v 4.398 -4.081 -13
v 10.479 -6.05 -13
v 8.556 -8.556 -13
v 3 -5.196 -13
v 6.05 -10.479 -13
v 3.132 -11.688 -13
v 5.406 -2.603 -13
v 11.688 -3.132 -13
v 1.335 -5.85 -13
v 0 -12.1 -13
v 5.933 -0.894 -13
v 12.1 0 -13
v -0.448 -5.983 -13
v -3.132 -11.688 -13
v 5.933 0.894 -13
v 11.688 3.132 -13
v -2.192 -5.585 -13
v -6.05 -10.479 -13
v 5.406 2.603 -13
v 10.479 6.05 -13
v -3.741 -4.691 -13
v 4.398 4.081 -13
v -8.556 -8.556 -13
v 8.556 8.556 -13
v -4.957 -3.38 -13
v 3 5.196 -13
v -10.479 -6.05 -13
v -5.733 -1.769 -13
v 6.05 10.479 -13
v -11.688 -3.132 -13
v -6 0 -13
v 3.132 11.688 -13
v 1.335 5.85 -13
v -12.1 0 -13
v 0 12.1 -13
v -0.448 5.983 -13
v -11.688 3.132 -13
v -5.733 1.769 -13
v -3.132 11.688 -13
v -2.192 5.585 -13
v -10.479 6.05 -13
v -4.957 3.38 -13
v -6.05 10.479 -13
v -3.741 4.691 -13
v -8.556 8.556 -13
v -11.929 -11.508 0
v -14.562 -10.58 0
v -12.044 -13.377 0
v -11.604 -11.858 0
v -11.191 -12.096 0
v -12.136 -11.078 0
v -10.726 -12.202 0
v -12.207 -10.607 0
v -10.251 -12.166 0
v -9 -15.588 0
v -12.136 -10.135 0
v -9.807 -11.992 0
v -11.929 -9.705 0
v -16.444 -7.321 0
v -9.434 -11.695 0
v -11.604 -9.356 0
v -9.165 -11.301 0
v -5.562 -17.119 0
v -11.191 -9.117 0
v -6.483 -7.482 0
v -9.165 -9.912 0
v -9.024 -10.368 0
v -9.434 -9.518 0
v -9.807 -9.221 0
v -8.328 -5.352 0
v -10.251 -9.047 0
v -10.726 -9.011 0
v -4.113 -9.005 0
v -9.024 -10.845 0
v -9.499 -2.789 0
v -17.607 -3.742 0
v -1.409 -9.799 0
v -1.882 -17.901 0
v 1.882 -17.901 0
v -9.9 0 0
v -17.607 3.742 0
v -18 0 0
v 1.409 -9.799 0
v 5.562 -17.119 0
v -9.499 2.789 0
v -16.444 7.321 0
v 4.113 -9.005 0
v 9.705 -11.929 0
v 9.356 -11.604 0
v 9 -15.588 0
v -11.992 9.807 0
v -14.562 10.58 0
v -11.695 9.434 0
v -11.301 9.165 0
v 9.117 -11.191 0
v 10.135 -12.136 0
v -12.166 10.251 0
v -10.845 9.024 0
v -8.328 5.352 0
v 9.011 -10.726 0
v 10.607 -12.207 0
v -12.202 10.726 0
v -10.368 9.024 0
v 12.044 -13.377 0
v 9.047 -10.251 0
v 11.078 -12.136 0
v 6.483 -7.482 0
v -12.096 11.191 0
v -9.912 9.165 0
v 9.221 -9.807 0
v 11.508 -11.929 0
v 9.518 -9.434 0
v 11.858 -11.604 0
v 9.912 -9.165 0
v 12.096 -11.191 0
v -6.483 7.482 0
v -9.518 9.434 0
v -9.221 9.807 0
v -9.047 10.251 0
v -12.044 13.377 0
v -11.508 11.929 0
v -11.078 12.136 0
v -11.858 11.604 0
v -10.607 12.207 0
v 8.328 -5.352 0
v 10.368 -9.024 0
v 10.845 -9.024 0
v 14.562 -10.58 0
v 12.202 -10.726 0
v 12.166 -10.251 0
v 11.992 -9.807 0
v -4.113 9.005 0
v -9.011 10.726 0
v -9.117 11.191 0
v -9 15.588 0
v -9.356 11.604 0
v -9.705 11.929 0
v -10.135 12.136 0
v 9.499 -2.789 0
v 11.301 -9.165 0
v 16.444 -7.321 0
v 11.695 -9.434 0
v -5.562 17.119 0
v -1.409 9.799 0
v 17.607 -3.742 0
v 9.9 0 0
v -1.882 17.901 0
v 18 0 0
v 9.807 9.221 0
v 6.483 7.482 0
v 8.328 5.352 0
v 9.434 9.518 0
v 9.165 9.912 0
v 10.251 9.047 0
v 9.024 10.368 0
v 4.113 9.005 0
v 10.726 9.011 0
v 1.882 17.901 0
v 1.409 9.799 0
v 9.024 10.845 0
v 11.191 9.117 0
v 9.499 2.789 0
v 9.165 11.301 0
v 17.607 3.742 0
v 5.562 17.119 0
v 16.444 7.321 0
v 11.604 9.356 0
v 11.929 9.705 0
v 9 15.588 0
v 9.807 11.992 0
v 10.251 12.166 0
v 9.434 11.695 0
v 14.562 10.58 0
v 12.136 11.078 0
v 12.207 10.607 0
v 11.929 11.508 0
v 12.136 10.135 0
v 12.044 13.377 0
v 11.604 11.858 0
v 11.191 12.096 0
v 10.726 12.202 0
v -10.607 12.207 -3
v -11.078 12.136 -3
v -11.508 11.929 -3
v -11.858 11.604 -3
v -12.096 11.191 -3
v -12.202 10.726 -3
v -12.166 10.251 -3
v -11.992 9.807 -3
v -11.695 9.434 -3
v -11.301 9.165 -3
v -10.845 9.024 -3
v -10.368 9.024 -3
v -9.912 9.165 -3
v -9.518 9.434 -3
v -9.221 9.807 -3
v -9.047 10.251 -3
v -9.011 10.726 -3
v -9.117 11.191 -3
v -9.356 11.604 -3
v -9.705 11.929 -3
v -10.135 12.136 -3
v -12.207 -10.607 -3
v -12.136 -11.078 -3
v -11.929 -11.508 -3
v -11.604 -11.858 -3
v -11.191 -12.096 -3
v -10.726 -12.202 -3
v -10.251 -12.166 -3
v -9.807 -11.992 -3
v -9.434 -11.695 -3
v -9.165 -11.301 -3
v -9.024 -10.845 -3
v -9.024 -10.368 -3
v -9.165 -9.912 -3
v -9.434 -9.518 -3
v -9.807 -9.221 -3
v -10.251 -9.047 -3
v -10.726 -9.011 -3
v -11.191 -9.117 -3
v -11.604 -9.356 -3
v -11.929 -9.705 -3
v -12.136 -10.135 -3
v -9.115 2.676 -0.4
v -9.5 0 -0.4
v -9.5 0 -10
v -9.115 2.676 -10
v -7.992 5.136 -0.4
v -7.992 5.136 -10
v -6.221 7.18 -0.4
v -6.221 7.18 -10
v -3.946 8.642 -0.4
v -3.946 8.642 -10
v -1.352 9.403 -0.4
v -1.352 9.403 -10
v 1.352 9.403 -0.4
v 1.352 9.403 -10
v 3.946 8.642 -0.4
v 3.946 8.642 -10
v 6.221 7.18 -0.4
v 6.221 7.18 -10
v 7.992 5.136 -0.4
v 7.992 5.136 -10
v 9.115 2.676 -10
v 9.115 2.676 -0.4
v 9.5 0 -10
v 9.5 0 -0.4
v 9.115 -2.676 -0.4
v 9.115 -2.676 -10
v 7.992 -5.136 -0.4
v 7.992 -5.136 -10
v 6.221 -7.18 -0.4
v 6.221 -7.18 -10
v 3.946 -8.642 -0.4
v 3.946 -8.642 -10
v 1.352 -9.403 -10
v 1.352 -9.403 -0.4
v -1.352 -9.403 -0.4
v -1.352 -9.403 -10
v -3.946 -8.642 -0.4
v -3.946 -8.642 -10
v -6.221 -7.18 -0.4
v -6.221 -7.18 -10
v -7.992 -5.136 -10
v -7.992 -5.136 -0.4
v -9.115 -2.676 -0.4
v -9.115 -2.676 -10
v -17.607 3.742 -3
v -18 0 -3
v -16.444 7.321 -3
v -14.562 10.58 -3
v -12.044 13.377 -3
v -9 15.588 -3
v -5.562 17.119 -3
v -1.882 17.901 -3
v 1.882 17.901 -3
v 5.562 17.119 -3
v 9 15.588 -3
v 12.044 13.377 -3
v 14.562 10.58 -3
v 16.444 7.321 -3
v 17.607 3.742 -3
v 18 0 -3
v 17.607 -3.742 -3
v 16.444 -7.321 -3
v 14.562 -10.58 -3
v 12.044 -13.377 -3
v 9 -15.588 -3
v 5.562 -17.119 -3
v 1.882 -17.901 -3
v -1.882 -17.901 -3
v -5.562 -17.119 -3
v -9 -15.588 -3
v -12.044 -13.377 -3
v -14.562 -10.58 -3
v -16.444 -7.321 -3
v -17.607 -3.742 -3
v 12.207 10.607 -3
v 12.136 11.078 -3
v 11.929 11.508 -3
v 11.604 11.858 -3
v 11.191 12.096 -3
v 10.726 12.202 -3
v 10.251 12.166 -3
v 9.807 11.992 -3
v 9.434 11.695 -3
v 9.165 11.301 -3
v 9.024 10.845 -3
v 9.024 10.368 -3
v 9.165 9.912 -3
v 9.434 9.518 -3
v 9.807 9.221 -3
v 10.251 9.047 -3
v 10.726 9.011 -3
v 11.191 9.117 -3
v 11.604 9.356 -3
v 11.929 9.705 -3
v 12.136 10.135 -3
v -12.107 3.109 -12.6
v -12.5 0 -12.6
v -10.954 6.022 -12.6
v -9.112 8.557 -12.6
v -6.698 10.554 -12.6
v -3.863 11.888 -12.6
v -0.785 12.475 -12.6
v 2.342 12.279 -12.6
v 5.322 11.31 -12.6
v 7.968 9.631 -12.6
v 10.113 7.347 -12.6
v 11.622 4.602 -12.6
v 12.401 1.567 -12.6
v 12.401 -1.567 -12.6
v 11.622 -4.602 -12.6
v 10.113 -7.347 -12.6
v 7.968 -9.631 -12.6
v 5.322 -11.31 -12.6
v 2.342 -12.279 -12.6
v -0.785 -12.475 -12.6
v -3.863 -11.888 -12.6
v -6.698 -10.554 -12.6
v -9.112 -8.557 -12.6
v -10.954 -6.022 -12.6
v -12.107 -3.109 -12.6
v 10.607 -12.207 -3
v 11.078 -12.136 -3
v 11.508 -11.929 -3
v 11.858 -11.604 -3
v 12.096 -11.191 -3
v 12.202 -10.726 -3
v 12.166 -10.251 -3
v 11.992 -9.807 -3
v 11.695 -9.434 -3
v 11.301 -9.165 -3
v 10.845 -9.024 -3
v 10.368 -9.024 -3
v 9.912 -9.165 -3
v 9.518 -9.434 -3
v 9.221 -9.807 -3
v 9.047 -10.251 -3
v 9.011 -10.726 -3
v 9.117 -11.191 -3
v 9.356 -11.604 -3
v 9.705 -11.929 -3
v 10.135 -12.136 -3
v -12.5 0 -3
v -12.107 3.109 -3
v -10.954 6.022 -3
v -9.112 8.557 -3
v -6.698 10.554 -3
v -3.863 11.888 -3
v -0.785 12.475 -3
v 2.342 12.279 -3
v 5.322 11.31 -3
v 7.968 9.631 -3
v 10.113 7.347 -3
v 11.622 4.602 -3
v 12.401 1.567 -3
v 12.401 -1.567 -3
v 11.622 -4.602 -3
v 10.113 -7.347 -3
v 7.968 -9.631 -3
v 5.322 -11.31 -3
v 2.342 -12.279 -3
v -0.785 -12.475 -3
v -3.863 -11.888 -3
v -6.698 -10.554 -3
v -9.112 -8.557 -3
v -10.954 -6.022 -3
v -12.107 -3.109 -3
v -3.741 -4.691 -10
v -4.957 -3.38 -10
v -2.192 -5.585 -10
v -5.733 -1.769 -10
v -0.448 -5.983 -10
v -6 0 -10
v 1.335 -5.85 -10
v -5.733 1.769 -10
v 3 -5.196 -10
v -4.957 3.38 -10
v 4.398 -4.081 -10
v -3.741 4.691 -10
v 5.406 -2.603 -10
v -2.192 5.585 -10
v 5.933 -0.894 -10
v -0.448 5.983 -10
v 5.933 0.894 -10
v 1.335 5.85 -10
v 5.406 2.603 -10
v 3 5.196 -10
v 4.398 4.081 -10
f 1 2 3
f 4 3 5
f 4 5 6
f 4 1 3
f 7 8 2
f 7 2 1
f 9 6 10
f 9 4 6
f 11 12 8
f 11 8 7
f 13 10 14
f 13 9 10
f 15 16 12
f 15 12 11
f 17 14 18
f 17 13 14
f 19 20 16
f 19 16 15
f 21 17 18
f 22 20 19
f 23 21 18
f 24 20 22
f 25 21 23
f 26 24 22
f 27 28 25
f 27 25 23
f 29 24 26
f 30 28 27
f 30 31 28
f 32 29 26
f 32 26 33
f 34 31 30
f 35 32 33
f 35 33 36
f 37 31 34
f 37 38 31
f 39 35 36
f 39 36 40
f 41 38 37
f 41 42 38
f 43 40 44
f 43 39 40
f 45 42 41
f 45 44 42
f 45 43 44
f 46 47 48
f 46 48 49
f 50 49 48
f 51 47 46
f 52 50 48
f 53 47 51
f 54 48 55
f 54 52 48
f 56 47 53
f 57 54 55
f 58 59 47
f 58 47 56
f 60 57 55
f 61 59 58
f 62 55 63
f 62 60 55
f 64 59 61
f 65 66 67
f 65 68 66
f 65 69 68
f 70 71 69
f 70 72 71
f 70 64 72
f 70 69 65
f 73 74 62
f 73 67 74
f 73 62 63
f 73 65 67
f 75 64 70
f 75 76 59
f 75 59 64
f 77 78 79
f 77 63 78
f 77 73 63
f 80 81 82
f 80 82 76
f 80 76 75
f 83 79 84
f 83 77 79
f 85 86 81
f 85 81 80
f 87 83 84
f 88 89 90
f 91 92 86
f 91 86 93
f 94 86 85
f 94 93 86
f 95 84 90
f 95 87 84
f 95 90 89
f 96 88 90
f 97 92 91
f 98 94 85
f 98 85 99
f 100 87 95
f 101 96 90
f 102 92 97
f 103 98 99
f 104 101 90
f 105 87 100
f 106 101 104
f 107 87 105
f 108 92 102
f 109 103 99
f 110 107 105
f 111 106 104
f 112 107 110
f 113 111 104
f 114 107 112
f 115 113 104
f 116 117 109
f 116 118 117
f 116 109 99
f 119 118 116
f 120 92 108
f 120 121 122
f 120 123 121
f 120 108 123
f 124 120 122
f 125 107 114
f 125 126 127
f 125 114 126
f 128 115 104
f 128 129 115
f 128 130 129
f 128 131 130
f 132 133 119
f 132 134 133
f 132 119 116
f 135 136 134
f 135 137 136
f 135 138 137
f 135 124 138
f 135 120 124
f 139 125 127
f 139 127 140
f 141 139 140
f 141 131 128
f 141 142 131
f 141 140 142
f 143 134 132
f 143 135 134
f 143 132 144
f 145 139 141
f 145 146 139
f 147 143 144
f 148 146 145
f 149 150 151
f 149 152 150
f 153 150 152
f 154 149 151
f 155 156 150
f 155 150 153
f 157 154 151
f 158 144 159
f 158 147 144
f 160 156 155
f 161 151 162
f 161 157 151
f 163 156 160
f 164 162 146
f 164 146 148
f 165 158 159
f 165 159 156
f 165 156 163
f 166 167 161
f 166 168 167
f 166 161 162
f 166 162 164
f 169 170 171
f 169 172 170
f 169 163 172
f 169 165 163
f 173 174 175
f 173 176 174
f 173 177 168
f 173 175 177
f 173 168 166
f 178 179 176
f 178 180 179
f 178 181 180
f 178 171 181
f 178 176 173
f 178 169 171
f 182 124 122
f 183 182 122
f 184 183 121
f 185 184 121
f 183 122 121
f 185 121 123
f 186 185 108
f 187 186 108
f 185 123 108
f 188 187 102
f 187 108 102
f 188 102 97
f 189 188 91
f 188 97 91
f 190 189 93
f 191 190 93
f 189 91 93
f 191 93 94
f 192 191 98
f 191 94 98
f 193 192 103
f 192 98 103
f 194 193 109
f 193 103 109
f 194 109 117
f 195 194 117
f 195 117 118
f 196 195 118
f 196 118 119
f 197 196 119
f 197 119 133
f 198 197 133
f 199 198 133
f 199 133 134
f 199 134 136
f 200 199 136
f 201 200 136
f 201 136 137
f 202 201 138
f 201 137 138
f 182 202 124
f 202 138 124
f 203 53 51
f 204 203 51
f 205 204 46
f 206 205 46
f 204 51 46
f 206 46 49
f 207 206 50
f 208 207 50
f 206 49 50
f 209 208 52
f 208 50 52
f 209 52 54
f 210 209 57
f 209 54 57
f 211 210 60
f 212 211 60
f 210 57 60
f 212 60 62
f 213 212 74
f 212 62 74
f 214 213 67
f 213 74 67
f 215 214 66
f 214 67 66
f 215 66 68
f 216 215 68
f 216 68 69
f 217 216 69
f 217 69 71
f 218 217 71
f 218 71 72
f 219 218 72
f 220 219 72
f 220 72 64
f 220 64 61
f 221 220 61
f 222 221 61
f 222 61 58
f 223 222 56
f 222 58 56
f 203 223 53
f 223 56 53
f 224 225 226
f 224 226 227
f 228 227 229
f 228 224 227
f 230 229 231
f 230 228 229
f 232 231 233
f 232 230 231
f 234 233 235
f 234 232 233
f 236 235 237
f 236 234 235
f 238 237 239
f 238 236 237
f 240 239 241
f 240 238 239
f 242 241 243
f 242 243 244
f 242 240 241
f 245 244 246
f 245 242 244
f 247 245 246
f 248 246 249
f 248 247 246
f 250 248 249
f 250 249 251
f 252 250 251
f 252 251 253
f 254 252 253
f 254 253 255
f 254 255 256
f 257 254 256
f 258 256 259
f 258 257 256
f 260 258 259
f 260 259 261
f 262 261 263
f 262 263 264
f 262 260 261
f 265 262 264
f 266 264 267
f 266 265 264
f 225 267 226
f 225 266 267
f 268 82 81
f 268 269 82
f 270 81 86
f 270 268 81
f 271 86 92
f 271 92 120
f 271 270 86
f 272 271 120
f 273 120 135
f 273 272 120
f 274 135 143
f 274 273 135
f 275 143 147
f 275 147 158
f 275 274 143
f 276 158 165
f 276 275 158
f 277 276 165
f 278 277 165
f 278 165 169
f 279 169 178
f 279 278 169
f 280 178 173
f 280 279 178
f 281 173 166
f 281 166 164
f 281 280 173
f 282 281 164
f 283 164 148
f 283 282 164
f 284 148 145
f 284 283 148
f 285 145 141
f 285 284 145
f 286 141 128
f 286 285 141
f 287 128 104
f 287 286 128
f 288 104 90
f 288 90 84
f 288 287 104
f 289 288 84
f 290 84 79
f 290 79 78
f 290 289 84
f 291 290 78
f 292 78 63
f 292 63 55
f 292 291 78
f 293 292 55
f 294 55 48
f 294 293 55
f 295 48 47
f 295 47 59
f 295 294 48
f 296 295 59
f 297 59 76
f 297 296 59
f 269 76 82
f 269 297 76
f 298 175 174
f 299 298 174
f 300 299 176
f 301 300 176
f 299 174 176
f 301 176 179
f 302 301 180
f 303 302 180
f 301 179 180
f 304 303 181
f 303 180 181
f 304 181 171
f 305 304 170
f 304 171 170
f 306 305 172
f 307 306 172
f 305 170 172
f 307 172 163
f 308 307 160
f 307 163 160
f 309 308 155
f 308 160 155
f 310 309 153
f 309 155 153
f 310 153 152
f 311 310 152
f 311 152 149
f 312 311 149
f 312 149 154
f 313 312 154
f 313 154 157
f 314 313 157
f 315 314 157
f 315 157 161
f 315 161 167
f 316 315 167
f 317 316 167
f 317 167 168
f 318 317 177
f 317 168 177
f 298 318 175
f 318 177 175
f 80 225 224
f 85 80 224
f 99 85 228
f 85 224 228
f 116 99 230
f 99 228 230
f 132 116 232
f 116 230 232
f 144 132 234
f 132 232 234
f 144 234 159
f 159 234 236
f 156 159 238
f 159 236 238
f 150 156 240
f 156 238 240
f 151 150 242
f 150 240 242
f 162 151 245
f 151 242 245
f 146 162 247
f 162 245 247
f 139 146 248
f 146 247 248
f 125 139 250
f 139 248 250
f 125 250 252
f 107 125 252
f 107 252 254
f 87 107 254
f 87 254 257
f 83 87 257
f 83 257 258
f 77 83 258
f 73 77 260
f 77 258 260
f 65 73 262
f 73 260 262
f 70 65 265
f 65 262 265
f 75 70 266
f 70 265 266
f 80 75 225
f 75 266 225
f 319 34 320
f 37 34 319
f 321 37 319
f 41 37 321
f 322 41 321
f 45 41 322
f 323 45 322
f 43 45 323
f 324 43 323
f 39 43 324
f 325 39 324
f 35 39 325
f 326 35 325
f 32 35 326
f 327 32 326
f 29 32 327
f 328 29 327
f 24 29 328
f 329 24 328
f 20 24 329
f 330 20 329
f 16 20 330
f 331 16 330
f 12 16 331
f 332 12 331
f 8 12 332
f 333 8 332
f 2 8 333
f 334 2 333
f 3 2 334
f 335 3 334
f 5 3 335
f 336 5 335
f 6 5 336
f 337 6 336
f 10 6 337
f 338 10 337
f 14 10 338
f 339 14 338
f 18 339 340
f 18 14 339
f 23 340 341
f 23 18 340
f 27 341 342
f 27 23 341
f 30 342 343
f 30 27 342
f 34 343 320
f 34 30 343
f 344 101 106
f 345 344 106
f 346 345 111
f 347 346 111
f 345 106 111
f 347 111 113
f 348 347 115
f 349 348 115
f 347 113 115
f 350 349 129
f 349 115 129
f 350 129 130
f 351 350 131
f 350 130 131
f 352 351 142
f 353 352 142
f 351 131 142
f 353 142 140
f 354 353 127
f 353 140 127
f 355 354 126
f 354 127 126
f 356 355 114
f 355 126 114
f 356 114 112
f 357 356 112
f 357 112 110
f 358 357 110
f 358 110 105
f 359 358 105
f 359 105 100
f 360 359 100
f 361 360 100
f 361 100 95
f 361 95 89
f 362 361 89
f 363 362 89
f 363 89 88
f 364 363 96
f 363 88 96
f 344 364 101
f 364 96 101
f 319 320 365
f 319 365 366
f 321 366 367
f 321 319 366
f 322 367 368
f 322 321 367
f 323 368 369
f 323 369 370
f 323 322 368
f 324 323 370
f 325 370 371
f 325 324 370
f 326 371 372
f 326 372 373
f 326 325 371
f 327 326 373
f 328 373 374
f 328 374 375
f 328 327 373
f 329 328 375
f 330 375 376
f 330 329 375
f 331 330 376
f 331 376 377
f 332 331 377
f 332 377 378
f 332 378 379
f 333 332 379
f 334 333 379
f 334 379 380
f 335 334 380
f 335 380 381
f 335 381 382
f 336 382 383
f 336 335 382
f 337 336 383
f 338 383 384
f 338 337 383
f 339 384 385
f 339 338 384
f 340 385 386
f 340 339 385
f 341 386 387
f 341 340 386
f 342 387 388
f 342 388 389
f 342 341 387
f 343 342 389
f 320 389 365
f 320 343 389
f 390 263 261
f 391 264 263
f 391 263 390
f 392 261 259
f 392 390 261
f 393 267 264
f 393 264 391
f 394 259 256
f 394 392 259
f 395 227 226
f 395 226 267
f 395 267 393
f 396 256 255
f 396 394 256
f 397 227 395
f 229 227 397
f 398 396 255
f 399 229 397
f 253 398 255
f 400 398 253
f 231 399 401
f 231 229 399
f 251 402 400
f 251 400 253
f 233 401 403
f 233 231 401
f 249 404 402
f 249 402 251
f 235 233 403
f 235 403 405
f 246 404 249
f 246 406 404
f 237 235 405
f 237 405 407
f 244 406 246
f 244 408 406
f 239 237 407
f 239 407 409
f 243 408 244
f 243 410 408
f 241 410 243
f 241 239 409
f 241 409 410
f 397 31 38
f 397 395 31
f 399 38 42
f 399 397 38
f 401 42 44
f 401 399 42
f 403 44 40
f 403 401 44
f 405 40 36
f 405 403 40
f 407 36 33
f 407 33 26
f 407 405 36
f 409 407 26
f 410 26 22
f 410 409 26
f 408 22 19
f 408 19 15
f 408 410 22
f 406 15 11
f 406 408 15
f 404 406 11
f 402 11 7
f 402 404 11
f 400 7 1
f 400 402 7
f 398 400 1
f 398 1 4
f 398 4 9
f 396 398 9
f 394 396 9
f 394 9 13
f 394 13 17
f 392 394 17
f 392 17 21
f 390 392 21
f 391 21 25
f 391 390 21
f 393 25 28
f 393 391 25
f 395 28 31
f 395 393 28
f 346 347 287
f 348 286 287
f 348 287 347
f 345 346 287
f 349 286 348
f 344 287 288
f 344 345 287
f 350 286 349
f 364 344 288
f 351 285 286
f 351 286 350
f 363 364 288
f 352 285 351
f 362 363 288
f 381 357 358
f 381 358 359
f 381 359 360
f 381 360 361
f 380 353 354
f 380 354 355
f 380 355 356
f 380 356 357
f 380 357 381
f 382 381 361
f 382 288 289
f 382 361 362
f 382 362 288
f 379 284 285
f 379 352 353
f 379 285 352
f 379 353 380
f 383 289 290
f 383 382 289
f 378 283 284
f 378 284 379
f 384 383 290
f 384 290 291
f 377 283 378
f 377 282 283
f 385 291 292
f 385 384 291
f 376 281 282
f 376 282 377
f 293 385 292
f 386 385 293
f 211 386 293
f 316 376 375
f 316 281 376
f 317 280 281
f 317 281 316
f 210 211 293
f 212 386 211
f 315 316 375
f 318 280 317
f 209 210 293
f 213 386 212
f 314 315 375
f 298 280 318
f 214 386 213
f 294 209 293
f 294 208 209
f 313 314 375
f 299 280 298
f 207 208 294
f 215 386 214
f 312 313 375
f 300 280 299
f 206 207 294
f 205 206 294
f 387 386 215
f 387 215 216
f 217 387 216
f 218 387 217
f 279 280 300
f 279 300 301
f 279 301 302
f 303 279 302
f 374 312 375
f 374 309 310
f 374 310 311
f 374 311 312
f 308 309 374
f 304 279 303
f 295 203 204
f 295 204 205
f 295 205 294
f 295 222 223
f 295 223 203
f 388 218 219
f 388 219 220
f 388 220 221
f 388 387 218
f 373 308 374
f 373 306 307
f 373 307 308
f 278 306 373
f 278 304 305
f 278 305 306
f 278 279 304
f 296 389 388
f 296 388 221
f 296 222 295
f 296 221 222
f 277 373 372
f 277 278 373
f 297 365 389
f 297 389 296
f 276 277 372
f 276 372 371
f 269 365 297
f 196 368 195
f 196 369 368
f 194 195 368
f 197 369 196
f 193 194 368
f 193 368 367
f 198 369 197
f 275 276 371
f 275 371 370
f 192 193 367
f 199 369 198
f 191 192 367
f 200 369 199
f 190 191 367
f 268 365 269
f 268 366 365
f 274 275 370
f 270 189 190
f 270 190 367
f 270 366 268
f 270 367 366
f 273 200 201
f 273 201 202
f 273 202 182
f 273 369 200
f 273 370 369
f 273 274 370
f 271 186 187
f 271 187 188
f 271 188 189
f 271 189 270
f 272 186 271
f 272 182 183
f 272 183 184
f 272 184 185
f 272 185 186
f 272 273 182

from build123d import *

# Parameters (mm, degrees)
SKETCH_2_R               = 1.6
CUT_EXTRUDE_1_DEPTH      = 3
PATTERN_CIRCULAR_1_COUNT = 4
CHAMFER_1_SIZE           = 0.4


with BuildPart() as part:
    # Эскиз1 → Повернуть1 (revolve)
    with BuildSketch(Plane(origin=(0, 0, 0), x_dir=(1, 0, 0), z_dir=(0, 1, 0))):
        Polygon((-18, 0), (-18, 3), (-12.5, 3), (-12.5, 13), (-6, 13), (-6, 10), (-9.5, 10), (-9.5, 0), align=None)
    revolve(axis=Axis((0, 0, 0), (0, 0, -1)))

    # Эскиз2 → Вырез-Вытянуть1 (cut)
    with BuildSketch(Plane.XY):
        with Locations((10.606601718, 10.606601718)):
            Circle(SKETCH_2_R)
    cut_extrude_1 = extrude(amount=-CUT_EXTRUDE_1_DEPTH, mode=Mode.SUBTRACT)

    # Круговой массив1: Вырез-Вытянуть1 ×4 about axis
    pattern_circular_1_axis = Axis((0, 0, 0), (0, 0, 1))
    for i in range(1, PATTERN_CIRCULAR_1_COUNT):
        add(cut_extrude_1.rotate(pattern_circular_1_axis, i * 360 / PATTERN_CIRCULAR_1_COUNT), mode=Mode.SUBTRACT)

    # Фаска1
    chamfer_1_edges = [part.edges().sort_by_distance(p)[0] for p in [
        (9.5, 0, 0),
        (12.5, 0, -13),
    ]]
    chamfer(chamfer_1_edges, length=CHAMFER_1_SIZE)


solid = part.part
